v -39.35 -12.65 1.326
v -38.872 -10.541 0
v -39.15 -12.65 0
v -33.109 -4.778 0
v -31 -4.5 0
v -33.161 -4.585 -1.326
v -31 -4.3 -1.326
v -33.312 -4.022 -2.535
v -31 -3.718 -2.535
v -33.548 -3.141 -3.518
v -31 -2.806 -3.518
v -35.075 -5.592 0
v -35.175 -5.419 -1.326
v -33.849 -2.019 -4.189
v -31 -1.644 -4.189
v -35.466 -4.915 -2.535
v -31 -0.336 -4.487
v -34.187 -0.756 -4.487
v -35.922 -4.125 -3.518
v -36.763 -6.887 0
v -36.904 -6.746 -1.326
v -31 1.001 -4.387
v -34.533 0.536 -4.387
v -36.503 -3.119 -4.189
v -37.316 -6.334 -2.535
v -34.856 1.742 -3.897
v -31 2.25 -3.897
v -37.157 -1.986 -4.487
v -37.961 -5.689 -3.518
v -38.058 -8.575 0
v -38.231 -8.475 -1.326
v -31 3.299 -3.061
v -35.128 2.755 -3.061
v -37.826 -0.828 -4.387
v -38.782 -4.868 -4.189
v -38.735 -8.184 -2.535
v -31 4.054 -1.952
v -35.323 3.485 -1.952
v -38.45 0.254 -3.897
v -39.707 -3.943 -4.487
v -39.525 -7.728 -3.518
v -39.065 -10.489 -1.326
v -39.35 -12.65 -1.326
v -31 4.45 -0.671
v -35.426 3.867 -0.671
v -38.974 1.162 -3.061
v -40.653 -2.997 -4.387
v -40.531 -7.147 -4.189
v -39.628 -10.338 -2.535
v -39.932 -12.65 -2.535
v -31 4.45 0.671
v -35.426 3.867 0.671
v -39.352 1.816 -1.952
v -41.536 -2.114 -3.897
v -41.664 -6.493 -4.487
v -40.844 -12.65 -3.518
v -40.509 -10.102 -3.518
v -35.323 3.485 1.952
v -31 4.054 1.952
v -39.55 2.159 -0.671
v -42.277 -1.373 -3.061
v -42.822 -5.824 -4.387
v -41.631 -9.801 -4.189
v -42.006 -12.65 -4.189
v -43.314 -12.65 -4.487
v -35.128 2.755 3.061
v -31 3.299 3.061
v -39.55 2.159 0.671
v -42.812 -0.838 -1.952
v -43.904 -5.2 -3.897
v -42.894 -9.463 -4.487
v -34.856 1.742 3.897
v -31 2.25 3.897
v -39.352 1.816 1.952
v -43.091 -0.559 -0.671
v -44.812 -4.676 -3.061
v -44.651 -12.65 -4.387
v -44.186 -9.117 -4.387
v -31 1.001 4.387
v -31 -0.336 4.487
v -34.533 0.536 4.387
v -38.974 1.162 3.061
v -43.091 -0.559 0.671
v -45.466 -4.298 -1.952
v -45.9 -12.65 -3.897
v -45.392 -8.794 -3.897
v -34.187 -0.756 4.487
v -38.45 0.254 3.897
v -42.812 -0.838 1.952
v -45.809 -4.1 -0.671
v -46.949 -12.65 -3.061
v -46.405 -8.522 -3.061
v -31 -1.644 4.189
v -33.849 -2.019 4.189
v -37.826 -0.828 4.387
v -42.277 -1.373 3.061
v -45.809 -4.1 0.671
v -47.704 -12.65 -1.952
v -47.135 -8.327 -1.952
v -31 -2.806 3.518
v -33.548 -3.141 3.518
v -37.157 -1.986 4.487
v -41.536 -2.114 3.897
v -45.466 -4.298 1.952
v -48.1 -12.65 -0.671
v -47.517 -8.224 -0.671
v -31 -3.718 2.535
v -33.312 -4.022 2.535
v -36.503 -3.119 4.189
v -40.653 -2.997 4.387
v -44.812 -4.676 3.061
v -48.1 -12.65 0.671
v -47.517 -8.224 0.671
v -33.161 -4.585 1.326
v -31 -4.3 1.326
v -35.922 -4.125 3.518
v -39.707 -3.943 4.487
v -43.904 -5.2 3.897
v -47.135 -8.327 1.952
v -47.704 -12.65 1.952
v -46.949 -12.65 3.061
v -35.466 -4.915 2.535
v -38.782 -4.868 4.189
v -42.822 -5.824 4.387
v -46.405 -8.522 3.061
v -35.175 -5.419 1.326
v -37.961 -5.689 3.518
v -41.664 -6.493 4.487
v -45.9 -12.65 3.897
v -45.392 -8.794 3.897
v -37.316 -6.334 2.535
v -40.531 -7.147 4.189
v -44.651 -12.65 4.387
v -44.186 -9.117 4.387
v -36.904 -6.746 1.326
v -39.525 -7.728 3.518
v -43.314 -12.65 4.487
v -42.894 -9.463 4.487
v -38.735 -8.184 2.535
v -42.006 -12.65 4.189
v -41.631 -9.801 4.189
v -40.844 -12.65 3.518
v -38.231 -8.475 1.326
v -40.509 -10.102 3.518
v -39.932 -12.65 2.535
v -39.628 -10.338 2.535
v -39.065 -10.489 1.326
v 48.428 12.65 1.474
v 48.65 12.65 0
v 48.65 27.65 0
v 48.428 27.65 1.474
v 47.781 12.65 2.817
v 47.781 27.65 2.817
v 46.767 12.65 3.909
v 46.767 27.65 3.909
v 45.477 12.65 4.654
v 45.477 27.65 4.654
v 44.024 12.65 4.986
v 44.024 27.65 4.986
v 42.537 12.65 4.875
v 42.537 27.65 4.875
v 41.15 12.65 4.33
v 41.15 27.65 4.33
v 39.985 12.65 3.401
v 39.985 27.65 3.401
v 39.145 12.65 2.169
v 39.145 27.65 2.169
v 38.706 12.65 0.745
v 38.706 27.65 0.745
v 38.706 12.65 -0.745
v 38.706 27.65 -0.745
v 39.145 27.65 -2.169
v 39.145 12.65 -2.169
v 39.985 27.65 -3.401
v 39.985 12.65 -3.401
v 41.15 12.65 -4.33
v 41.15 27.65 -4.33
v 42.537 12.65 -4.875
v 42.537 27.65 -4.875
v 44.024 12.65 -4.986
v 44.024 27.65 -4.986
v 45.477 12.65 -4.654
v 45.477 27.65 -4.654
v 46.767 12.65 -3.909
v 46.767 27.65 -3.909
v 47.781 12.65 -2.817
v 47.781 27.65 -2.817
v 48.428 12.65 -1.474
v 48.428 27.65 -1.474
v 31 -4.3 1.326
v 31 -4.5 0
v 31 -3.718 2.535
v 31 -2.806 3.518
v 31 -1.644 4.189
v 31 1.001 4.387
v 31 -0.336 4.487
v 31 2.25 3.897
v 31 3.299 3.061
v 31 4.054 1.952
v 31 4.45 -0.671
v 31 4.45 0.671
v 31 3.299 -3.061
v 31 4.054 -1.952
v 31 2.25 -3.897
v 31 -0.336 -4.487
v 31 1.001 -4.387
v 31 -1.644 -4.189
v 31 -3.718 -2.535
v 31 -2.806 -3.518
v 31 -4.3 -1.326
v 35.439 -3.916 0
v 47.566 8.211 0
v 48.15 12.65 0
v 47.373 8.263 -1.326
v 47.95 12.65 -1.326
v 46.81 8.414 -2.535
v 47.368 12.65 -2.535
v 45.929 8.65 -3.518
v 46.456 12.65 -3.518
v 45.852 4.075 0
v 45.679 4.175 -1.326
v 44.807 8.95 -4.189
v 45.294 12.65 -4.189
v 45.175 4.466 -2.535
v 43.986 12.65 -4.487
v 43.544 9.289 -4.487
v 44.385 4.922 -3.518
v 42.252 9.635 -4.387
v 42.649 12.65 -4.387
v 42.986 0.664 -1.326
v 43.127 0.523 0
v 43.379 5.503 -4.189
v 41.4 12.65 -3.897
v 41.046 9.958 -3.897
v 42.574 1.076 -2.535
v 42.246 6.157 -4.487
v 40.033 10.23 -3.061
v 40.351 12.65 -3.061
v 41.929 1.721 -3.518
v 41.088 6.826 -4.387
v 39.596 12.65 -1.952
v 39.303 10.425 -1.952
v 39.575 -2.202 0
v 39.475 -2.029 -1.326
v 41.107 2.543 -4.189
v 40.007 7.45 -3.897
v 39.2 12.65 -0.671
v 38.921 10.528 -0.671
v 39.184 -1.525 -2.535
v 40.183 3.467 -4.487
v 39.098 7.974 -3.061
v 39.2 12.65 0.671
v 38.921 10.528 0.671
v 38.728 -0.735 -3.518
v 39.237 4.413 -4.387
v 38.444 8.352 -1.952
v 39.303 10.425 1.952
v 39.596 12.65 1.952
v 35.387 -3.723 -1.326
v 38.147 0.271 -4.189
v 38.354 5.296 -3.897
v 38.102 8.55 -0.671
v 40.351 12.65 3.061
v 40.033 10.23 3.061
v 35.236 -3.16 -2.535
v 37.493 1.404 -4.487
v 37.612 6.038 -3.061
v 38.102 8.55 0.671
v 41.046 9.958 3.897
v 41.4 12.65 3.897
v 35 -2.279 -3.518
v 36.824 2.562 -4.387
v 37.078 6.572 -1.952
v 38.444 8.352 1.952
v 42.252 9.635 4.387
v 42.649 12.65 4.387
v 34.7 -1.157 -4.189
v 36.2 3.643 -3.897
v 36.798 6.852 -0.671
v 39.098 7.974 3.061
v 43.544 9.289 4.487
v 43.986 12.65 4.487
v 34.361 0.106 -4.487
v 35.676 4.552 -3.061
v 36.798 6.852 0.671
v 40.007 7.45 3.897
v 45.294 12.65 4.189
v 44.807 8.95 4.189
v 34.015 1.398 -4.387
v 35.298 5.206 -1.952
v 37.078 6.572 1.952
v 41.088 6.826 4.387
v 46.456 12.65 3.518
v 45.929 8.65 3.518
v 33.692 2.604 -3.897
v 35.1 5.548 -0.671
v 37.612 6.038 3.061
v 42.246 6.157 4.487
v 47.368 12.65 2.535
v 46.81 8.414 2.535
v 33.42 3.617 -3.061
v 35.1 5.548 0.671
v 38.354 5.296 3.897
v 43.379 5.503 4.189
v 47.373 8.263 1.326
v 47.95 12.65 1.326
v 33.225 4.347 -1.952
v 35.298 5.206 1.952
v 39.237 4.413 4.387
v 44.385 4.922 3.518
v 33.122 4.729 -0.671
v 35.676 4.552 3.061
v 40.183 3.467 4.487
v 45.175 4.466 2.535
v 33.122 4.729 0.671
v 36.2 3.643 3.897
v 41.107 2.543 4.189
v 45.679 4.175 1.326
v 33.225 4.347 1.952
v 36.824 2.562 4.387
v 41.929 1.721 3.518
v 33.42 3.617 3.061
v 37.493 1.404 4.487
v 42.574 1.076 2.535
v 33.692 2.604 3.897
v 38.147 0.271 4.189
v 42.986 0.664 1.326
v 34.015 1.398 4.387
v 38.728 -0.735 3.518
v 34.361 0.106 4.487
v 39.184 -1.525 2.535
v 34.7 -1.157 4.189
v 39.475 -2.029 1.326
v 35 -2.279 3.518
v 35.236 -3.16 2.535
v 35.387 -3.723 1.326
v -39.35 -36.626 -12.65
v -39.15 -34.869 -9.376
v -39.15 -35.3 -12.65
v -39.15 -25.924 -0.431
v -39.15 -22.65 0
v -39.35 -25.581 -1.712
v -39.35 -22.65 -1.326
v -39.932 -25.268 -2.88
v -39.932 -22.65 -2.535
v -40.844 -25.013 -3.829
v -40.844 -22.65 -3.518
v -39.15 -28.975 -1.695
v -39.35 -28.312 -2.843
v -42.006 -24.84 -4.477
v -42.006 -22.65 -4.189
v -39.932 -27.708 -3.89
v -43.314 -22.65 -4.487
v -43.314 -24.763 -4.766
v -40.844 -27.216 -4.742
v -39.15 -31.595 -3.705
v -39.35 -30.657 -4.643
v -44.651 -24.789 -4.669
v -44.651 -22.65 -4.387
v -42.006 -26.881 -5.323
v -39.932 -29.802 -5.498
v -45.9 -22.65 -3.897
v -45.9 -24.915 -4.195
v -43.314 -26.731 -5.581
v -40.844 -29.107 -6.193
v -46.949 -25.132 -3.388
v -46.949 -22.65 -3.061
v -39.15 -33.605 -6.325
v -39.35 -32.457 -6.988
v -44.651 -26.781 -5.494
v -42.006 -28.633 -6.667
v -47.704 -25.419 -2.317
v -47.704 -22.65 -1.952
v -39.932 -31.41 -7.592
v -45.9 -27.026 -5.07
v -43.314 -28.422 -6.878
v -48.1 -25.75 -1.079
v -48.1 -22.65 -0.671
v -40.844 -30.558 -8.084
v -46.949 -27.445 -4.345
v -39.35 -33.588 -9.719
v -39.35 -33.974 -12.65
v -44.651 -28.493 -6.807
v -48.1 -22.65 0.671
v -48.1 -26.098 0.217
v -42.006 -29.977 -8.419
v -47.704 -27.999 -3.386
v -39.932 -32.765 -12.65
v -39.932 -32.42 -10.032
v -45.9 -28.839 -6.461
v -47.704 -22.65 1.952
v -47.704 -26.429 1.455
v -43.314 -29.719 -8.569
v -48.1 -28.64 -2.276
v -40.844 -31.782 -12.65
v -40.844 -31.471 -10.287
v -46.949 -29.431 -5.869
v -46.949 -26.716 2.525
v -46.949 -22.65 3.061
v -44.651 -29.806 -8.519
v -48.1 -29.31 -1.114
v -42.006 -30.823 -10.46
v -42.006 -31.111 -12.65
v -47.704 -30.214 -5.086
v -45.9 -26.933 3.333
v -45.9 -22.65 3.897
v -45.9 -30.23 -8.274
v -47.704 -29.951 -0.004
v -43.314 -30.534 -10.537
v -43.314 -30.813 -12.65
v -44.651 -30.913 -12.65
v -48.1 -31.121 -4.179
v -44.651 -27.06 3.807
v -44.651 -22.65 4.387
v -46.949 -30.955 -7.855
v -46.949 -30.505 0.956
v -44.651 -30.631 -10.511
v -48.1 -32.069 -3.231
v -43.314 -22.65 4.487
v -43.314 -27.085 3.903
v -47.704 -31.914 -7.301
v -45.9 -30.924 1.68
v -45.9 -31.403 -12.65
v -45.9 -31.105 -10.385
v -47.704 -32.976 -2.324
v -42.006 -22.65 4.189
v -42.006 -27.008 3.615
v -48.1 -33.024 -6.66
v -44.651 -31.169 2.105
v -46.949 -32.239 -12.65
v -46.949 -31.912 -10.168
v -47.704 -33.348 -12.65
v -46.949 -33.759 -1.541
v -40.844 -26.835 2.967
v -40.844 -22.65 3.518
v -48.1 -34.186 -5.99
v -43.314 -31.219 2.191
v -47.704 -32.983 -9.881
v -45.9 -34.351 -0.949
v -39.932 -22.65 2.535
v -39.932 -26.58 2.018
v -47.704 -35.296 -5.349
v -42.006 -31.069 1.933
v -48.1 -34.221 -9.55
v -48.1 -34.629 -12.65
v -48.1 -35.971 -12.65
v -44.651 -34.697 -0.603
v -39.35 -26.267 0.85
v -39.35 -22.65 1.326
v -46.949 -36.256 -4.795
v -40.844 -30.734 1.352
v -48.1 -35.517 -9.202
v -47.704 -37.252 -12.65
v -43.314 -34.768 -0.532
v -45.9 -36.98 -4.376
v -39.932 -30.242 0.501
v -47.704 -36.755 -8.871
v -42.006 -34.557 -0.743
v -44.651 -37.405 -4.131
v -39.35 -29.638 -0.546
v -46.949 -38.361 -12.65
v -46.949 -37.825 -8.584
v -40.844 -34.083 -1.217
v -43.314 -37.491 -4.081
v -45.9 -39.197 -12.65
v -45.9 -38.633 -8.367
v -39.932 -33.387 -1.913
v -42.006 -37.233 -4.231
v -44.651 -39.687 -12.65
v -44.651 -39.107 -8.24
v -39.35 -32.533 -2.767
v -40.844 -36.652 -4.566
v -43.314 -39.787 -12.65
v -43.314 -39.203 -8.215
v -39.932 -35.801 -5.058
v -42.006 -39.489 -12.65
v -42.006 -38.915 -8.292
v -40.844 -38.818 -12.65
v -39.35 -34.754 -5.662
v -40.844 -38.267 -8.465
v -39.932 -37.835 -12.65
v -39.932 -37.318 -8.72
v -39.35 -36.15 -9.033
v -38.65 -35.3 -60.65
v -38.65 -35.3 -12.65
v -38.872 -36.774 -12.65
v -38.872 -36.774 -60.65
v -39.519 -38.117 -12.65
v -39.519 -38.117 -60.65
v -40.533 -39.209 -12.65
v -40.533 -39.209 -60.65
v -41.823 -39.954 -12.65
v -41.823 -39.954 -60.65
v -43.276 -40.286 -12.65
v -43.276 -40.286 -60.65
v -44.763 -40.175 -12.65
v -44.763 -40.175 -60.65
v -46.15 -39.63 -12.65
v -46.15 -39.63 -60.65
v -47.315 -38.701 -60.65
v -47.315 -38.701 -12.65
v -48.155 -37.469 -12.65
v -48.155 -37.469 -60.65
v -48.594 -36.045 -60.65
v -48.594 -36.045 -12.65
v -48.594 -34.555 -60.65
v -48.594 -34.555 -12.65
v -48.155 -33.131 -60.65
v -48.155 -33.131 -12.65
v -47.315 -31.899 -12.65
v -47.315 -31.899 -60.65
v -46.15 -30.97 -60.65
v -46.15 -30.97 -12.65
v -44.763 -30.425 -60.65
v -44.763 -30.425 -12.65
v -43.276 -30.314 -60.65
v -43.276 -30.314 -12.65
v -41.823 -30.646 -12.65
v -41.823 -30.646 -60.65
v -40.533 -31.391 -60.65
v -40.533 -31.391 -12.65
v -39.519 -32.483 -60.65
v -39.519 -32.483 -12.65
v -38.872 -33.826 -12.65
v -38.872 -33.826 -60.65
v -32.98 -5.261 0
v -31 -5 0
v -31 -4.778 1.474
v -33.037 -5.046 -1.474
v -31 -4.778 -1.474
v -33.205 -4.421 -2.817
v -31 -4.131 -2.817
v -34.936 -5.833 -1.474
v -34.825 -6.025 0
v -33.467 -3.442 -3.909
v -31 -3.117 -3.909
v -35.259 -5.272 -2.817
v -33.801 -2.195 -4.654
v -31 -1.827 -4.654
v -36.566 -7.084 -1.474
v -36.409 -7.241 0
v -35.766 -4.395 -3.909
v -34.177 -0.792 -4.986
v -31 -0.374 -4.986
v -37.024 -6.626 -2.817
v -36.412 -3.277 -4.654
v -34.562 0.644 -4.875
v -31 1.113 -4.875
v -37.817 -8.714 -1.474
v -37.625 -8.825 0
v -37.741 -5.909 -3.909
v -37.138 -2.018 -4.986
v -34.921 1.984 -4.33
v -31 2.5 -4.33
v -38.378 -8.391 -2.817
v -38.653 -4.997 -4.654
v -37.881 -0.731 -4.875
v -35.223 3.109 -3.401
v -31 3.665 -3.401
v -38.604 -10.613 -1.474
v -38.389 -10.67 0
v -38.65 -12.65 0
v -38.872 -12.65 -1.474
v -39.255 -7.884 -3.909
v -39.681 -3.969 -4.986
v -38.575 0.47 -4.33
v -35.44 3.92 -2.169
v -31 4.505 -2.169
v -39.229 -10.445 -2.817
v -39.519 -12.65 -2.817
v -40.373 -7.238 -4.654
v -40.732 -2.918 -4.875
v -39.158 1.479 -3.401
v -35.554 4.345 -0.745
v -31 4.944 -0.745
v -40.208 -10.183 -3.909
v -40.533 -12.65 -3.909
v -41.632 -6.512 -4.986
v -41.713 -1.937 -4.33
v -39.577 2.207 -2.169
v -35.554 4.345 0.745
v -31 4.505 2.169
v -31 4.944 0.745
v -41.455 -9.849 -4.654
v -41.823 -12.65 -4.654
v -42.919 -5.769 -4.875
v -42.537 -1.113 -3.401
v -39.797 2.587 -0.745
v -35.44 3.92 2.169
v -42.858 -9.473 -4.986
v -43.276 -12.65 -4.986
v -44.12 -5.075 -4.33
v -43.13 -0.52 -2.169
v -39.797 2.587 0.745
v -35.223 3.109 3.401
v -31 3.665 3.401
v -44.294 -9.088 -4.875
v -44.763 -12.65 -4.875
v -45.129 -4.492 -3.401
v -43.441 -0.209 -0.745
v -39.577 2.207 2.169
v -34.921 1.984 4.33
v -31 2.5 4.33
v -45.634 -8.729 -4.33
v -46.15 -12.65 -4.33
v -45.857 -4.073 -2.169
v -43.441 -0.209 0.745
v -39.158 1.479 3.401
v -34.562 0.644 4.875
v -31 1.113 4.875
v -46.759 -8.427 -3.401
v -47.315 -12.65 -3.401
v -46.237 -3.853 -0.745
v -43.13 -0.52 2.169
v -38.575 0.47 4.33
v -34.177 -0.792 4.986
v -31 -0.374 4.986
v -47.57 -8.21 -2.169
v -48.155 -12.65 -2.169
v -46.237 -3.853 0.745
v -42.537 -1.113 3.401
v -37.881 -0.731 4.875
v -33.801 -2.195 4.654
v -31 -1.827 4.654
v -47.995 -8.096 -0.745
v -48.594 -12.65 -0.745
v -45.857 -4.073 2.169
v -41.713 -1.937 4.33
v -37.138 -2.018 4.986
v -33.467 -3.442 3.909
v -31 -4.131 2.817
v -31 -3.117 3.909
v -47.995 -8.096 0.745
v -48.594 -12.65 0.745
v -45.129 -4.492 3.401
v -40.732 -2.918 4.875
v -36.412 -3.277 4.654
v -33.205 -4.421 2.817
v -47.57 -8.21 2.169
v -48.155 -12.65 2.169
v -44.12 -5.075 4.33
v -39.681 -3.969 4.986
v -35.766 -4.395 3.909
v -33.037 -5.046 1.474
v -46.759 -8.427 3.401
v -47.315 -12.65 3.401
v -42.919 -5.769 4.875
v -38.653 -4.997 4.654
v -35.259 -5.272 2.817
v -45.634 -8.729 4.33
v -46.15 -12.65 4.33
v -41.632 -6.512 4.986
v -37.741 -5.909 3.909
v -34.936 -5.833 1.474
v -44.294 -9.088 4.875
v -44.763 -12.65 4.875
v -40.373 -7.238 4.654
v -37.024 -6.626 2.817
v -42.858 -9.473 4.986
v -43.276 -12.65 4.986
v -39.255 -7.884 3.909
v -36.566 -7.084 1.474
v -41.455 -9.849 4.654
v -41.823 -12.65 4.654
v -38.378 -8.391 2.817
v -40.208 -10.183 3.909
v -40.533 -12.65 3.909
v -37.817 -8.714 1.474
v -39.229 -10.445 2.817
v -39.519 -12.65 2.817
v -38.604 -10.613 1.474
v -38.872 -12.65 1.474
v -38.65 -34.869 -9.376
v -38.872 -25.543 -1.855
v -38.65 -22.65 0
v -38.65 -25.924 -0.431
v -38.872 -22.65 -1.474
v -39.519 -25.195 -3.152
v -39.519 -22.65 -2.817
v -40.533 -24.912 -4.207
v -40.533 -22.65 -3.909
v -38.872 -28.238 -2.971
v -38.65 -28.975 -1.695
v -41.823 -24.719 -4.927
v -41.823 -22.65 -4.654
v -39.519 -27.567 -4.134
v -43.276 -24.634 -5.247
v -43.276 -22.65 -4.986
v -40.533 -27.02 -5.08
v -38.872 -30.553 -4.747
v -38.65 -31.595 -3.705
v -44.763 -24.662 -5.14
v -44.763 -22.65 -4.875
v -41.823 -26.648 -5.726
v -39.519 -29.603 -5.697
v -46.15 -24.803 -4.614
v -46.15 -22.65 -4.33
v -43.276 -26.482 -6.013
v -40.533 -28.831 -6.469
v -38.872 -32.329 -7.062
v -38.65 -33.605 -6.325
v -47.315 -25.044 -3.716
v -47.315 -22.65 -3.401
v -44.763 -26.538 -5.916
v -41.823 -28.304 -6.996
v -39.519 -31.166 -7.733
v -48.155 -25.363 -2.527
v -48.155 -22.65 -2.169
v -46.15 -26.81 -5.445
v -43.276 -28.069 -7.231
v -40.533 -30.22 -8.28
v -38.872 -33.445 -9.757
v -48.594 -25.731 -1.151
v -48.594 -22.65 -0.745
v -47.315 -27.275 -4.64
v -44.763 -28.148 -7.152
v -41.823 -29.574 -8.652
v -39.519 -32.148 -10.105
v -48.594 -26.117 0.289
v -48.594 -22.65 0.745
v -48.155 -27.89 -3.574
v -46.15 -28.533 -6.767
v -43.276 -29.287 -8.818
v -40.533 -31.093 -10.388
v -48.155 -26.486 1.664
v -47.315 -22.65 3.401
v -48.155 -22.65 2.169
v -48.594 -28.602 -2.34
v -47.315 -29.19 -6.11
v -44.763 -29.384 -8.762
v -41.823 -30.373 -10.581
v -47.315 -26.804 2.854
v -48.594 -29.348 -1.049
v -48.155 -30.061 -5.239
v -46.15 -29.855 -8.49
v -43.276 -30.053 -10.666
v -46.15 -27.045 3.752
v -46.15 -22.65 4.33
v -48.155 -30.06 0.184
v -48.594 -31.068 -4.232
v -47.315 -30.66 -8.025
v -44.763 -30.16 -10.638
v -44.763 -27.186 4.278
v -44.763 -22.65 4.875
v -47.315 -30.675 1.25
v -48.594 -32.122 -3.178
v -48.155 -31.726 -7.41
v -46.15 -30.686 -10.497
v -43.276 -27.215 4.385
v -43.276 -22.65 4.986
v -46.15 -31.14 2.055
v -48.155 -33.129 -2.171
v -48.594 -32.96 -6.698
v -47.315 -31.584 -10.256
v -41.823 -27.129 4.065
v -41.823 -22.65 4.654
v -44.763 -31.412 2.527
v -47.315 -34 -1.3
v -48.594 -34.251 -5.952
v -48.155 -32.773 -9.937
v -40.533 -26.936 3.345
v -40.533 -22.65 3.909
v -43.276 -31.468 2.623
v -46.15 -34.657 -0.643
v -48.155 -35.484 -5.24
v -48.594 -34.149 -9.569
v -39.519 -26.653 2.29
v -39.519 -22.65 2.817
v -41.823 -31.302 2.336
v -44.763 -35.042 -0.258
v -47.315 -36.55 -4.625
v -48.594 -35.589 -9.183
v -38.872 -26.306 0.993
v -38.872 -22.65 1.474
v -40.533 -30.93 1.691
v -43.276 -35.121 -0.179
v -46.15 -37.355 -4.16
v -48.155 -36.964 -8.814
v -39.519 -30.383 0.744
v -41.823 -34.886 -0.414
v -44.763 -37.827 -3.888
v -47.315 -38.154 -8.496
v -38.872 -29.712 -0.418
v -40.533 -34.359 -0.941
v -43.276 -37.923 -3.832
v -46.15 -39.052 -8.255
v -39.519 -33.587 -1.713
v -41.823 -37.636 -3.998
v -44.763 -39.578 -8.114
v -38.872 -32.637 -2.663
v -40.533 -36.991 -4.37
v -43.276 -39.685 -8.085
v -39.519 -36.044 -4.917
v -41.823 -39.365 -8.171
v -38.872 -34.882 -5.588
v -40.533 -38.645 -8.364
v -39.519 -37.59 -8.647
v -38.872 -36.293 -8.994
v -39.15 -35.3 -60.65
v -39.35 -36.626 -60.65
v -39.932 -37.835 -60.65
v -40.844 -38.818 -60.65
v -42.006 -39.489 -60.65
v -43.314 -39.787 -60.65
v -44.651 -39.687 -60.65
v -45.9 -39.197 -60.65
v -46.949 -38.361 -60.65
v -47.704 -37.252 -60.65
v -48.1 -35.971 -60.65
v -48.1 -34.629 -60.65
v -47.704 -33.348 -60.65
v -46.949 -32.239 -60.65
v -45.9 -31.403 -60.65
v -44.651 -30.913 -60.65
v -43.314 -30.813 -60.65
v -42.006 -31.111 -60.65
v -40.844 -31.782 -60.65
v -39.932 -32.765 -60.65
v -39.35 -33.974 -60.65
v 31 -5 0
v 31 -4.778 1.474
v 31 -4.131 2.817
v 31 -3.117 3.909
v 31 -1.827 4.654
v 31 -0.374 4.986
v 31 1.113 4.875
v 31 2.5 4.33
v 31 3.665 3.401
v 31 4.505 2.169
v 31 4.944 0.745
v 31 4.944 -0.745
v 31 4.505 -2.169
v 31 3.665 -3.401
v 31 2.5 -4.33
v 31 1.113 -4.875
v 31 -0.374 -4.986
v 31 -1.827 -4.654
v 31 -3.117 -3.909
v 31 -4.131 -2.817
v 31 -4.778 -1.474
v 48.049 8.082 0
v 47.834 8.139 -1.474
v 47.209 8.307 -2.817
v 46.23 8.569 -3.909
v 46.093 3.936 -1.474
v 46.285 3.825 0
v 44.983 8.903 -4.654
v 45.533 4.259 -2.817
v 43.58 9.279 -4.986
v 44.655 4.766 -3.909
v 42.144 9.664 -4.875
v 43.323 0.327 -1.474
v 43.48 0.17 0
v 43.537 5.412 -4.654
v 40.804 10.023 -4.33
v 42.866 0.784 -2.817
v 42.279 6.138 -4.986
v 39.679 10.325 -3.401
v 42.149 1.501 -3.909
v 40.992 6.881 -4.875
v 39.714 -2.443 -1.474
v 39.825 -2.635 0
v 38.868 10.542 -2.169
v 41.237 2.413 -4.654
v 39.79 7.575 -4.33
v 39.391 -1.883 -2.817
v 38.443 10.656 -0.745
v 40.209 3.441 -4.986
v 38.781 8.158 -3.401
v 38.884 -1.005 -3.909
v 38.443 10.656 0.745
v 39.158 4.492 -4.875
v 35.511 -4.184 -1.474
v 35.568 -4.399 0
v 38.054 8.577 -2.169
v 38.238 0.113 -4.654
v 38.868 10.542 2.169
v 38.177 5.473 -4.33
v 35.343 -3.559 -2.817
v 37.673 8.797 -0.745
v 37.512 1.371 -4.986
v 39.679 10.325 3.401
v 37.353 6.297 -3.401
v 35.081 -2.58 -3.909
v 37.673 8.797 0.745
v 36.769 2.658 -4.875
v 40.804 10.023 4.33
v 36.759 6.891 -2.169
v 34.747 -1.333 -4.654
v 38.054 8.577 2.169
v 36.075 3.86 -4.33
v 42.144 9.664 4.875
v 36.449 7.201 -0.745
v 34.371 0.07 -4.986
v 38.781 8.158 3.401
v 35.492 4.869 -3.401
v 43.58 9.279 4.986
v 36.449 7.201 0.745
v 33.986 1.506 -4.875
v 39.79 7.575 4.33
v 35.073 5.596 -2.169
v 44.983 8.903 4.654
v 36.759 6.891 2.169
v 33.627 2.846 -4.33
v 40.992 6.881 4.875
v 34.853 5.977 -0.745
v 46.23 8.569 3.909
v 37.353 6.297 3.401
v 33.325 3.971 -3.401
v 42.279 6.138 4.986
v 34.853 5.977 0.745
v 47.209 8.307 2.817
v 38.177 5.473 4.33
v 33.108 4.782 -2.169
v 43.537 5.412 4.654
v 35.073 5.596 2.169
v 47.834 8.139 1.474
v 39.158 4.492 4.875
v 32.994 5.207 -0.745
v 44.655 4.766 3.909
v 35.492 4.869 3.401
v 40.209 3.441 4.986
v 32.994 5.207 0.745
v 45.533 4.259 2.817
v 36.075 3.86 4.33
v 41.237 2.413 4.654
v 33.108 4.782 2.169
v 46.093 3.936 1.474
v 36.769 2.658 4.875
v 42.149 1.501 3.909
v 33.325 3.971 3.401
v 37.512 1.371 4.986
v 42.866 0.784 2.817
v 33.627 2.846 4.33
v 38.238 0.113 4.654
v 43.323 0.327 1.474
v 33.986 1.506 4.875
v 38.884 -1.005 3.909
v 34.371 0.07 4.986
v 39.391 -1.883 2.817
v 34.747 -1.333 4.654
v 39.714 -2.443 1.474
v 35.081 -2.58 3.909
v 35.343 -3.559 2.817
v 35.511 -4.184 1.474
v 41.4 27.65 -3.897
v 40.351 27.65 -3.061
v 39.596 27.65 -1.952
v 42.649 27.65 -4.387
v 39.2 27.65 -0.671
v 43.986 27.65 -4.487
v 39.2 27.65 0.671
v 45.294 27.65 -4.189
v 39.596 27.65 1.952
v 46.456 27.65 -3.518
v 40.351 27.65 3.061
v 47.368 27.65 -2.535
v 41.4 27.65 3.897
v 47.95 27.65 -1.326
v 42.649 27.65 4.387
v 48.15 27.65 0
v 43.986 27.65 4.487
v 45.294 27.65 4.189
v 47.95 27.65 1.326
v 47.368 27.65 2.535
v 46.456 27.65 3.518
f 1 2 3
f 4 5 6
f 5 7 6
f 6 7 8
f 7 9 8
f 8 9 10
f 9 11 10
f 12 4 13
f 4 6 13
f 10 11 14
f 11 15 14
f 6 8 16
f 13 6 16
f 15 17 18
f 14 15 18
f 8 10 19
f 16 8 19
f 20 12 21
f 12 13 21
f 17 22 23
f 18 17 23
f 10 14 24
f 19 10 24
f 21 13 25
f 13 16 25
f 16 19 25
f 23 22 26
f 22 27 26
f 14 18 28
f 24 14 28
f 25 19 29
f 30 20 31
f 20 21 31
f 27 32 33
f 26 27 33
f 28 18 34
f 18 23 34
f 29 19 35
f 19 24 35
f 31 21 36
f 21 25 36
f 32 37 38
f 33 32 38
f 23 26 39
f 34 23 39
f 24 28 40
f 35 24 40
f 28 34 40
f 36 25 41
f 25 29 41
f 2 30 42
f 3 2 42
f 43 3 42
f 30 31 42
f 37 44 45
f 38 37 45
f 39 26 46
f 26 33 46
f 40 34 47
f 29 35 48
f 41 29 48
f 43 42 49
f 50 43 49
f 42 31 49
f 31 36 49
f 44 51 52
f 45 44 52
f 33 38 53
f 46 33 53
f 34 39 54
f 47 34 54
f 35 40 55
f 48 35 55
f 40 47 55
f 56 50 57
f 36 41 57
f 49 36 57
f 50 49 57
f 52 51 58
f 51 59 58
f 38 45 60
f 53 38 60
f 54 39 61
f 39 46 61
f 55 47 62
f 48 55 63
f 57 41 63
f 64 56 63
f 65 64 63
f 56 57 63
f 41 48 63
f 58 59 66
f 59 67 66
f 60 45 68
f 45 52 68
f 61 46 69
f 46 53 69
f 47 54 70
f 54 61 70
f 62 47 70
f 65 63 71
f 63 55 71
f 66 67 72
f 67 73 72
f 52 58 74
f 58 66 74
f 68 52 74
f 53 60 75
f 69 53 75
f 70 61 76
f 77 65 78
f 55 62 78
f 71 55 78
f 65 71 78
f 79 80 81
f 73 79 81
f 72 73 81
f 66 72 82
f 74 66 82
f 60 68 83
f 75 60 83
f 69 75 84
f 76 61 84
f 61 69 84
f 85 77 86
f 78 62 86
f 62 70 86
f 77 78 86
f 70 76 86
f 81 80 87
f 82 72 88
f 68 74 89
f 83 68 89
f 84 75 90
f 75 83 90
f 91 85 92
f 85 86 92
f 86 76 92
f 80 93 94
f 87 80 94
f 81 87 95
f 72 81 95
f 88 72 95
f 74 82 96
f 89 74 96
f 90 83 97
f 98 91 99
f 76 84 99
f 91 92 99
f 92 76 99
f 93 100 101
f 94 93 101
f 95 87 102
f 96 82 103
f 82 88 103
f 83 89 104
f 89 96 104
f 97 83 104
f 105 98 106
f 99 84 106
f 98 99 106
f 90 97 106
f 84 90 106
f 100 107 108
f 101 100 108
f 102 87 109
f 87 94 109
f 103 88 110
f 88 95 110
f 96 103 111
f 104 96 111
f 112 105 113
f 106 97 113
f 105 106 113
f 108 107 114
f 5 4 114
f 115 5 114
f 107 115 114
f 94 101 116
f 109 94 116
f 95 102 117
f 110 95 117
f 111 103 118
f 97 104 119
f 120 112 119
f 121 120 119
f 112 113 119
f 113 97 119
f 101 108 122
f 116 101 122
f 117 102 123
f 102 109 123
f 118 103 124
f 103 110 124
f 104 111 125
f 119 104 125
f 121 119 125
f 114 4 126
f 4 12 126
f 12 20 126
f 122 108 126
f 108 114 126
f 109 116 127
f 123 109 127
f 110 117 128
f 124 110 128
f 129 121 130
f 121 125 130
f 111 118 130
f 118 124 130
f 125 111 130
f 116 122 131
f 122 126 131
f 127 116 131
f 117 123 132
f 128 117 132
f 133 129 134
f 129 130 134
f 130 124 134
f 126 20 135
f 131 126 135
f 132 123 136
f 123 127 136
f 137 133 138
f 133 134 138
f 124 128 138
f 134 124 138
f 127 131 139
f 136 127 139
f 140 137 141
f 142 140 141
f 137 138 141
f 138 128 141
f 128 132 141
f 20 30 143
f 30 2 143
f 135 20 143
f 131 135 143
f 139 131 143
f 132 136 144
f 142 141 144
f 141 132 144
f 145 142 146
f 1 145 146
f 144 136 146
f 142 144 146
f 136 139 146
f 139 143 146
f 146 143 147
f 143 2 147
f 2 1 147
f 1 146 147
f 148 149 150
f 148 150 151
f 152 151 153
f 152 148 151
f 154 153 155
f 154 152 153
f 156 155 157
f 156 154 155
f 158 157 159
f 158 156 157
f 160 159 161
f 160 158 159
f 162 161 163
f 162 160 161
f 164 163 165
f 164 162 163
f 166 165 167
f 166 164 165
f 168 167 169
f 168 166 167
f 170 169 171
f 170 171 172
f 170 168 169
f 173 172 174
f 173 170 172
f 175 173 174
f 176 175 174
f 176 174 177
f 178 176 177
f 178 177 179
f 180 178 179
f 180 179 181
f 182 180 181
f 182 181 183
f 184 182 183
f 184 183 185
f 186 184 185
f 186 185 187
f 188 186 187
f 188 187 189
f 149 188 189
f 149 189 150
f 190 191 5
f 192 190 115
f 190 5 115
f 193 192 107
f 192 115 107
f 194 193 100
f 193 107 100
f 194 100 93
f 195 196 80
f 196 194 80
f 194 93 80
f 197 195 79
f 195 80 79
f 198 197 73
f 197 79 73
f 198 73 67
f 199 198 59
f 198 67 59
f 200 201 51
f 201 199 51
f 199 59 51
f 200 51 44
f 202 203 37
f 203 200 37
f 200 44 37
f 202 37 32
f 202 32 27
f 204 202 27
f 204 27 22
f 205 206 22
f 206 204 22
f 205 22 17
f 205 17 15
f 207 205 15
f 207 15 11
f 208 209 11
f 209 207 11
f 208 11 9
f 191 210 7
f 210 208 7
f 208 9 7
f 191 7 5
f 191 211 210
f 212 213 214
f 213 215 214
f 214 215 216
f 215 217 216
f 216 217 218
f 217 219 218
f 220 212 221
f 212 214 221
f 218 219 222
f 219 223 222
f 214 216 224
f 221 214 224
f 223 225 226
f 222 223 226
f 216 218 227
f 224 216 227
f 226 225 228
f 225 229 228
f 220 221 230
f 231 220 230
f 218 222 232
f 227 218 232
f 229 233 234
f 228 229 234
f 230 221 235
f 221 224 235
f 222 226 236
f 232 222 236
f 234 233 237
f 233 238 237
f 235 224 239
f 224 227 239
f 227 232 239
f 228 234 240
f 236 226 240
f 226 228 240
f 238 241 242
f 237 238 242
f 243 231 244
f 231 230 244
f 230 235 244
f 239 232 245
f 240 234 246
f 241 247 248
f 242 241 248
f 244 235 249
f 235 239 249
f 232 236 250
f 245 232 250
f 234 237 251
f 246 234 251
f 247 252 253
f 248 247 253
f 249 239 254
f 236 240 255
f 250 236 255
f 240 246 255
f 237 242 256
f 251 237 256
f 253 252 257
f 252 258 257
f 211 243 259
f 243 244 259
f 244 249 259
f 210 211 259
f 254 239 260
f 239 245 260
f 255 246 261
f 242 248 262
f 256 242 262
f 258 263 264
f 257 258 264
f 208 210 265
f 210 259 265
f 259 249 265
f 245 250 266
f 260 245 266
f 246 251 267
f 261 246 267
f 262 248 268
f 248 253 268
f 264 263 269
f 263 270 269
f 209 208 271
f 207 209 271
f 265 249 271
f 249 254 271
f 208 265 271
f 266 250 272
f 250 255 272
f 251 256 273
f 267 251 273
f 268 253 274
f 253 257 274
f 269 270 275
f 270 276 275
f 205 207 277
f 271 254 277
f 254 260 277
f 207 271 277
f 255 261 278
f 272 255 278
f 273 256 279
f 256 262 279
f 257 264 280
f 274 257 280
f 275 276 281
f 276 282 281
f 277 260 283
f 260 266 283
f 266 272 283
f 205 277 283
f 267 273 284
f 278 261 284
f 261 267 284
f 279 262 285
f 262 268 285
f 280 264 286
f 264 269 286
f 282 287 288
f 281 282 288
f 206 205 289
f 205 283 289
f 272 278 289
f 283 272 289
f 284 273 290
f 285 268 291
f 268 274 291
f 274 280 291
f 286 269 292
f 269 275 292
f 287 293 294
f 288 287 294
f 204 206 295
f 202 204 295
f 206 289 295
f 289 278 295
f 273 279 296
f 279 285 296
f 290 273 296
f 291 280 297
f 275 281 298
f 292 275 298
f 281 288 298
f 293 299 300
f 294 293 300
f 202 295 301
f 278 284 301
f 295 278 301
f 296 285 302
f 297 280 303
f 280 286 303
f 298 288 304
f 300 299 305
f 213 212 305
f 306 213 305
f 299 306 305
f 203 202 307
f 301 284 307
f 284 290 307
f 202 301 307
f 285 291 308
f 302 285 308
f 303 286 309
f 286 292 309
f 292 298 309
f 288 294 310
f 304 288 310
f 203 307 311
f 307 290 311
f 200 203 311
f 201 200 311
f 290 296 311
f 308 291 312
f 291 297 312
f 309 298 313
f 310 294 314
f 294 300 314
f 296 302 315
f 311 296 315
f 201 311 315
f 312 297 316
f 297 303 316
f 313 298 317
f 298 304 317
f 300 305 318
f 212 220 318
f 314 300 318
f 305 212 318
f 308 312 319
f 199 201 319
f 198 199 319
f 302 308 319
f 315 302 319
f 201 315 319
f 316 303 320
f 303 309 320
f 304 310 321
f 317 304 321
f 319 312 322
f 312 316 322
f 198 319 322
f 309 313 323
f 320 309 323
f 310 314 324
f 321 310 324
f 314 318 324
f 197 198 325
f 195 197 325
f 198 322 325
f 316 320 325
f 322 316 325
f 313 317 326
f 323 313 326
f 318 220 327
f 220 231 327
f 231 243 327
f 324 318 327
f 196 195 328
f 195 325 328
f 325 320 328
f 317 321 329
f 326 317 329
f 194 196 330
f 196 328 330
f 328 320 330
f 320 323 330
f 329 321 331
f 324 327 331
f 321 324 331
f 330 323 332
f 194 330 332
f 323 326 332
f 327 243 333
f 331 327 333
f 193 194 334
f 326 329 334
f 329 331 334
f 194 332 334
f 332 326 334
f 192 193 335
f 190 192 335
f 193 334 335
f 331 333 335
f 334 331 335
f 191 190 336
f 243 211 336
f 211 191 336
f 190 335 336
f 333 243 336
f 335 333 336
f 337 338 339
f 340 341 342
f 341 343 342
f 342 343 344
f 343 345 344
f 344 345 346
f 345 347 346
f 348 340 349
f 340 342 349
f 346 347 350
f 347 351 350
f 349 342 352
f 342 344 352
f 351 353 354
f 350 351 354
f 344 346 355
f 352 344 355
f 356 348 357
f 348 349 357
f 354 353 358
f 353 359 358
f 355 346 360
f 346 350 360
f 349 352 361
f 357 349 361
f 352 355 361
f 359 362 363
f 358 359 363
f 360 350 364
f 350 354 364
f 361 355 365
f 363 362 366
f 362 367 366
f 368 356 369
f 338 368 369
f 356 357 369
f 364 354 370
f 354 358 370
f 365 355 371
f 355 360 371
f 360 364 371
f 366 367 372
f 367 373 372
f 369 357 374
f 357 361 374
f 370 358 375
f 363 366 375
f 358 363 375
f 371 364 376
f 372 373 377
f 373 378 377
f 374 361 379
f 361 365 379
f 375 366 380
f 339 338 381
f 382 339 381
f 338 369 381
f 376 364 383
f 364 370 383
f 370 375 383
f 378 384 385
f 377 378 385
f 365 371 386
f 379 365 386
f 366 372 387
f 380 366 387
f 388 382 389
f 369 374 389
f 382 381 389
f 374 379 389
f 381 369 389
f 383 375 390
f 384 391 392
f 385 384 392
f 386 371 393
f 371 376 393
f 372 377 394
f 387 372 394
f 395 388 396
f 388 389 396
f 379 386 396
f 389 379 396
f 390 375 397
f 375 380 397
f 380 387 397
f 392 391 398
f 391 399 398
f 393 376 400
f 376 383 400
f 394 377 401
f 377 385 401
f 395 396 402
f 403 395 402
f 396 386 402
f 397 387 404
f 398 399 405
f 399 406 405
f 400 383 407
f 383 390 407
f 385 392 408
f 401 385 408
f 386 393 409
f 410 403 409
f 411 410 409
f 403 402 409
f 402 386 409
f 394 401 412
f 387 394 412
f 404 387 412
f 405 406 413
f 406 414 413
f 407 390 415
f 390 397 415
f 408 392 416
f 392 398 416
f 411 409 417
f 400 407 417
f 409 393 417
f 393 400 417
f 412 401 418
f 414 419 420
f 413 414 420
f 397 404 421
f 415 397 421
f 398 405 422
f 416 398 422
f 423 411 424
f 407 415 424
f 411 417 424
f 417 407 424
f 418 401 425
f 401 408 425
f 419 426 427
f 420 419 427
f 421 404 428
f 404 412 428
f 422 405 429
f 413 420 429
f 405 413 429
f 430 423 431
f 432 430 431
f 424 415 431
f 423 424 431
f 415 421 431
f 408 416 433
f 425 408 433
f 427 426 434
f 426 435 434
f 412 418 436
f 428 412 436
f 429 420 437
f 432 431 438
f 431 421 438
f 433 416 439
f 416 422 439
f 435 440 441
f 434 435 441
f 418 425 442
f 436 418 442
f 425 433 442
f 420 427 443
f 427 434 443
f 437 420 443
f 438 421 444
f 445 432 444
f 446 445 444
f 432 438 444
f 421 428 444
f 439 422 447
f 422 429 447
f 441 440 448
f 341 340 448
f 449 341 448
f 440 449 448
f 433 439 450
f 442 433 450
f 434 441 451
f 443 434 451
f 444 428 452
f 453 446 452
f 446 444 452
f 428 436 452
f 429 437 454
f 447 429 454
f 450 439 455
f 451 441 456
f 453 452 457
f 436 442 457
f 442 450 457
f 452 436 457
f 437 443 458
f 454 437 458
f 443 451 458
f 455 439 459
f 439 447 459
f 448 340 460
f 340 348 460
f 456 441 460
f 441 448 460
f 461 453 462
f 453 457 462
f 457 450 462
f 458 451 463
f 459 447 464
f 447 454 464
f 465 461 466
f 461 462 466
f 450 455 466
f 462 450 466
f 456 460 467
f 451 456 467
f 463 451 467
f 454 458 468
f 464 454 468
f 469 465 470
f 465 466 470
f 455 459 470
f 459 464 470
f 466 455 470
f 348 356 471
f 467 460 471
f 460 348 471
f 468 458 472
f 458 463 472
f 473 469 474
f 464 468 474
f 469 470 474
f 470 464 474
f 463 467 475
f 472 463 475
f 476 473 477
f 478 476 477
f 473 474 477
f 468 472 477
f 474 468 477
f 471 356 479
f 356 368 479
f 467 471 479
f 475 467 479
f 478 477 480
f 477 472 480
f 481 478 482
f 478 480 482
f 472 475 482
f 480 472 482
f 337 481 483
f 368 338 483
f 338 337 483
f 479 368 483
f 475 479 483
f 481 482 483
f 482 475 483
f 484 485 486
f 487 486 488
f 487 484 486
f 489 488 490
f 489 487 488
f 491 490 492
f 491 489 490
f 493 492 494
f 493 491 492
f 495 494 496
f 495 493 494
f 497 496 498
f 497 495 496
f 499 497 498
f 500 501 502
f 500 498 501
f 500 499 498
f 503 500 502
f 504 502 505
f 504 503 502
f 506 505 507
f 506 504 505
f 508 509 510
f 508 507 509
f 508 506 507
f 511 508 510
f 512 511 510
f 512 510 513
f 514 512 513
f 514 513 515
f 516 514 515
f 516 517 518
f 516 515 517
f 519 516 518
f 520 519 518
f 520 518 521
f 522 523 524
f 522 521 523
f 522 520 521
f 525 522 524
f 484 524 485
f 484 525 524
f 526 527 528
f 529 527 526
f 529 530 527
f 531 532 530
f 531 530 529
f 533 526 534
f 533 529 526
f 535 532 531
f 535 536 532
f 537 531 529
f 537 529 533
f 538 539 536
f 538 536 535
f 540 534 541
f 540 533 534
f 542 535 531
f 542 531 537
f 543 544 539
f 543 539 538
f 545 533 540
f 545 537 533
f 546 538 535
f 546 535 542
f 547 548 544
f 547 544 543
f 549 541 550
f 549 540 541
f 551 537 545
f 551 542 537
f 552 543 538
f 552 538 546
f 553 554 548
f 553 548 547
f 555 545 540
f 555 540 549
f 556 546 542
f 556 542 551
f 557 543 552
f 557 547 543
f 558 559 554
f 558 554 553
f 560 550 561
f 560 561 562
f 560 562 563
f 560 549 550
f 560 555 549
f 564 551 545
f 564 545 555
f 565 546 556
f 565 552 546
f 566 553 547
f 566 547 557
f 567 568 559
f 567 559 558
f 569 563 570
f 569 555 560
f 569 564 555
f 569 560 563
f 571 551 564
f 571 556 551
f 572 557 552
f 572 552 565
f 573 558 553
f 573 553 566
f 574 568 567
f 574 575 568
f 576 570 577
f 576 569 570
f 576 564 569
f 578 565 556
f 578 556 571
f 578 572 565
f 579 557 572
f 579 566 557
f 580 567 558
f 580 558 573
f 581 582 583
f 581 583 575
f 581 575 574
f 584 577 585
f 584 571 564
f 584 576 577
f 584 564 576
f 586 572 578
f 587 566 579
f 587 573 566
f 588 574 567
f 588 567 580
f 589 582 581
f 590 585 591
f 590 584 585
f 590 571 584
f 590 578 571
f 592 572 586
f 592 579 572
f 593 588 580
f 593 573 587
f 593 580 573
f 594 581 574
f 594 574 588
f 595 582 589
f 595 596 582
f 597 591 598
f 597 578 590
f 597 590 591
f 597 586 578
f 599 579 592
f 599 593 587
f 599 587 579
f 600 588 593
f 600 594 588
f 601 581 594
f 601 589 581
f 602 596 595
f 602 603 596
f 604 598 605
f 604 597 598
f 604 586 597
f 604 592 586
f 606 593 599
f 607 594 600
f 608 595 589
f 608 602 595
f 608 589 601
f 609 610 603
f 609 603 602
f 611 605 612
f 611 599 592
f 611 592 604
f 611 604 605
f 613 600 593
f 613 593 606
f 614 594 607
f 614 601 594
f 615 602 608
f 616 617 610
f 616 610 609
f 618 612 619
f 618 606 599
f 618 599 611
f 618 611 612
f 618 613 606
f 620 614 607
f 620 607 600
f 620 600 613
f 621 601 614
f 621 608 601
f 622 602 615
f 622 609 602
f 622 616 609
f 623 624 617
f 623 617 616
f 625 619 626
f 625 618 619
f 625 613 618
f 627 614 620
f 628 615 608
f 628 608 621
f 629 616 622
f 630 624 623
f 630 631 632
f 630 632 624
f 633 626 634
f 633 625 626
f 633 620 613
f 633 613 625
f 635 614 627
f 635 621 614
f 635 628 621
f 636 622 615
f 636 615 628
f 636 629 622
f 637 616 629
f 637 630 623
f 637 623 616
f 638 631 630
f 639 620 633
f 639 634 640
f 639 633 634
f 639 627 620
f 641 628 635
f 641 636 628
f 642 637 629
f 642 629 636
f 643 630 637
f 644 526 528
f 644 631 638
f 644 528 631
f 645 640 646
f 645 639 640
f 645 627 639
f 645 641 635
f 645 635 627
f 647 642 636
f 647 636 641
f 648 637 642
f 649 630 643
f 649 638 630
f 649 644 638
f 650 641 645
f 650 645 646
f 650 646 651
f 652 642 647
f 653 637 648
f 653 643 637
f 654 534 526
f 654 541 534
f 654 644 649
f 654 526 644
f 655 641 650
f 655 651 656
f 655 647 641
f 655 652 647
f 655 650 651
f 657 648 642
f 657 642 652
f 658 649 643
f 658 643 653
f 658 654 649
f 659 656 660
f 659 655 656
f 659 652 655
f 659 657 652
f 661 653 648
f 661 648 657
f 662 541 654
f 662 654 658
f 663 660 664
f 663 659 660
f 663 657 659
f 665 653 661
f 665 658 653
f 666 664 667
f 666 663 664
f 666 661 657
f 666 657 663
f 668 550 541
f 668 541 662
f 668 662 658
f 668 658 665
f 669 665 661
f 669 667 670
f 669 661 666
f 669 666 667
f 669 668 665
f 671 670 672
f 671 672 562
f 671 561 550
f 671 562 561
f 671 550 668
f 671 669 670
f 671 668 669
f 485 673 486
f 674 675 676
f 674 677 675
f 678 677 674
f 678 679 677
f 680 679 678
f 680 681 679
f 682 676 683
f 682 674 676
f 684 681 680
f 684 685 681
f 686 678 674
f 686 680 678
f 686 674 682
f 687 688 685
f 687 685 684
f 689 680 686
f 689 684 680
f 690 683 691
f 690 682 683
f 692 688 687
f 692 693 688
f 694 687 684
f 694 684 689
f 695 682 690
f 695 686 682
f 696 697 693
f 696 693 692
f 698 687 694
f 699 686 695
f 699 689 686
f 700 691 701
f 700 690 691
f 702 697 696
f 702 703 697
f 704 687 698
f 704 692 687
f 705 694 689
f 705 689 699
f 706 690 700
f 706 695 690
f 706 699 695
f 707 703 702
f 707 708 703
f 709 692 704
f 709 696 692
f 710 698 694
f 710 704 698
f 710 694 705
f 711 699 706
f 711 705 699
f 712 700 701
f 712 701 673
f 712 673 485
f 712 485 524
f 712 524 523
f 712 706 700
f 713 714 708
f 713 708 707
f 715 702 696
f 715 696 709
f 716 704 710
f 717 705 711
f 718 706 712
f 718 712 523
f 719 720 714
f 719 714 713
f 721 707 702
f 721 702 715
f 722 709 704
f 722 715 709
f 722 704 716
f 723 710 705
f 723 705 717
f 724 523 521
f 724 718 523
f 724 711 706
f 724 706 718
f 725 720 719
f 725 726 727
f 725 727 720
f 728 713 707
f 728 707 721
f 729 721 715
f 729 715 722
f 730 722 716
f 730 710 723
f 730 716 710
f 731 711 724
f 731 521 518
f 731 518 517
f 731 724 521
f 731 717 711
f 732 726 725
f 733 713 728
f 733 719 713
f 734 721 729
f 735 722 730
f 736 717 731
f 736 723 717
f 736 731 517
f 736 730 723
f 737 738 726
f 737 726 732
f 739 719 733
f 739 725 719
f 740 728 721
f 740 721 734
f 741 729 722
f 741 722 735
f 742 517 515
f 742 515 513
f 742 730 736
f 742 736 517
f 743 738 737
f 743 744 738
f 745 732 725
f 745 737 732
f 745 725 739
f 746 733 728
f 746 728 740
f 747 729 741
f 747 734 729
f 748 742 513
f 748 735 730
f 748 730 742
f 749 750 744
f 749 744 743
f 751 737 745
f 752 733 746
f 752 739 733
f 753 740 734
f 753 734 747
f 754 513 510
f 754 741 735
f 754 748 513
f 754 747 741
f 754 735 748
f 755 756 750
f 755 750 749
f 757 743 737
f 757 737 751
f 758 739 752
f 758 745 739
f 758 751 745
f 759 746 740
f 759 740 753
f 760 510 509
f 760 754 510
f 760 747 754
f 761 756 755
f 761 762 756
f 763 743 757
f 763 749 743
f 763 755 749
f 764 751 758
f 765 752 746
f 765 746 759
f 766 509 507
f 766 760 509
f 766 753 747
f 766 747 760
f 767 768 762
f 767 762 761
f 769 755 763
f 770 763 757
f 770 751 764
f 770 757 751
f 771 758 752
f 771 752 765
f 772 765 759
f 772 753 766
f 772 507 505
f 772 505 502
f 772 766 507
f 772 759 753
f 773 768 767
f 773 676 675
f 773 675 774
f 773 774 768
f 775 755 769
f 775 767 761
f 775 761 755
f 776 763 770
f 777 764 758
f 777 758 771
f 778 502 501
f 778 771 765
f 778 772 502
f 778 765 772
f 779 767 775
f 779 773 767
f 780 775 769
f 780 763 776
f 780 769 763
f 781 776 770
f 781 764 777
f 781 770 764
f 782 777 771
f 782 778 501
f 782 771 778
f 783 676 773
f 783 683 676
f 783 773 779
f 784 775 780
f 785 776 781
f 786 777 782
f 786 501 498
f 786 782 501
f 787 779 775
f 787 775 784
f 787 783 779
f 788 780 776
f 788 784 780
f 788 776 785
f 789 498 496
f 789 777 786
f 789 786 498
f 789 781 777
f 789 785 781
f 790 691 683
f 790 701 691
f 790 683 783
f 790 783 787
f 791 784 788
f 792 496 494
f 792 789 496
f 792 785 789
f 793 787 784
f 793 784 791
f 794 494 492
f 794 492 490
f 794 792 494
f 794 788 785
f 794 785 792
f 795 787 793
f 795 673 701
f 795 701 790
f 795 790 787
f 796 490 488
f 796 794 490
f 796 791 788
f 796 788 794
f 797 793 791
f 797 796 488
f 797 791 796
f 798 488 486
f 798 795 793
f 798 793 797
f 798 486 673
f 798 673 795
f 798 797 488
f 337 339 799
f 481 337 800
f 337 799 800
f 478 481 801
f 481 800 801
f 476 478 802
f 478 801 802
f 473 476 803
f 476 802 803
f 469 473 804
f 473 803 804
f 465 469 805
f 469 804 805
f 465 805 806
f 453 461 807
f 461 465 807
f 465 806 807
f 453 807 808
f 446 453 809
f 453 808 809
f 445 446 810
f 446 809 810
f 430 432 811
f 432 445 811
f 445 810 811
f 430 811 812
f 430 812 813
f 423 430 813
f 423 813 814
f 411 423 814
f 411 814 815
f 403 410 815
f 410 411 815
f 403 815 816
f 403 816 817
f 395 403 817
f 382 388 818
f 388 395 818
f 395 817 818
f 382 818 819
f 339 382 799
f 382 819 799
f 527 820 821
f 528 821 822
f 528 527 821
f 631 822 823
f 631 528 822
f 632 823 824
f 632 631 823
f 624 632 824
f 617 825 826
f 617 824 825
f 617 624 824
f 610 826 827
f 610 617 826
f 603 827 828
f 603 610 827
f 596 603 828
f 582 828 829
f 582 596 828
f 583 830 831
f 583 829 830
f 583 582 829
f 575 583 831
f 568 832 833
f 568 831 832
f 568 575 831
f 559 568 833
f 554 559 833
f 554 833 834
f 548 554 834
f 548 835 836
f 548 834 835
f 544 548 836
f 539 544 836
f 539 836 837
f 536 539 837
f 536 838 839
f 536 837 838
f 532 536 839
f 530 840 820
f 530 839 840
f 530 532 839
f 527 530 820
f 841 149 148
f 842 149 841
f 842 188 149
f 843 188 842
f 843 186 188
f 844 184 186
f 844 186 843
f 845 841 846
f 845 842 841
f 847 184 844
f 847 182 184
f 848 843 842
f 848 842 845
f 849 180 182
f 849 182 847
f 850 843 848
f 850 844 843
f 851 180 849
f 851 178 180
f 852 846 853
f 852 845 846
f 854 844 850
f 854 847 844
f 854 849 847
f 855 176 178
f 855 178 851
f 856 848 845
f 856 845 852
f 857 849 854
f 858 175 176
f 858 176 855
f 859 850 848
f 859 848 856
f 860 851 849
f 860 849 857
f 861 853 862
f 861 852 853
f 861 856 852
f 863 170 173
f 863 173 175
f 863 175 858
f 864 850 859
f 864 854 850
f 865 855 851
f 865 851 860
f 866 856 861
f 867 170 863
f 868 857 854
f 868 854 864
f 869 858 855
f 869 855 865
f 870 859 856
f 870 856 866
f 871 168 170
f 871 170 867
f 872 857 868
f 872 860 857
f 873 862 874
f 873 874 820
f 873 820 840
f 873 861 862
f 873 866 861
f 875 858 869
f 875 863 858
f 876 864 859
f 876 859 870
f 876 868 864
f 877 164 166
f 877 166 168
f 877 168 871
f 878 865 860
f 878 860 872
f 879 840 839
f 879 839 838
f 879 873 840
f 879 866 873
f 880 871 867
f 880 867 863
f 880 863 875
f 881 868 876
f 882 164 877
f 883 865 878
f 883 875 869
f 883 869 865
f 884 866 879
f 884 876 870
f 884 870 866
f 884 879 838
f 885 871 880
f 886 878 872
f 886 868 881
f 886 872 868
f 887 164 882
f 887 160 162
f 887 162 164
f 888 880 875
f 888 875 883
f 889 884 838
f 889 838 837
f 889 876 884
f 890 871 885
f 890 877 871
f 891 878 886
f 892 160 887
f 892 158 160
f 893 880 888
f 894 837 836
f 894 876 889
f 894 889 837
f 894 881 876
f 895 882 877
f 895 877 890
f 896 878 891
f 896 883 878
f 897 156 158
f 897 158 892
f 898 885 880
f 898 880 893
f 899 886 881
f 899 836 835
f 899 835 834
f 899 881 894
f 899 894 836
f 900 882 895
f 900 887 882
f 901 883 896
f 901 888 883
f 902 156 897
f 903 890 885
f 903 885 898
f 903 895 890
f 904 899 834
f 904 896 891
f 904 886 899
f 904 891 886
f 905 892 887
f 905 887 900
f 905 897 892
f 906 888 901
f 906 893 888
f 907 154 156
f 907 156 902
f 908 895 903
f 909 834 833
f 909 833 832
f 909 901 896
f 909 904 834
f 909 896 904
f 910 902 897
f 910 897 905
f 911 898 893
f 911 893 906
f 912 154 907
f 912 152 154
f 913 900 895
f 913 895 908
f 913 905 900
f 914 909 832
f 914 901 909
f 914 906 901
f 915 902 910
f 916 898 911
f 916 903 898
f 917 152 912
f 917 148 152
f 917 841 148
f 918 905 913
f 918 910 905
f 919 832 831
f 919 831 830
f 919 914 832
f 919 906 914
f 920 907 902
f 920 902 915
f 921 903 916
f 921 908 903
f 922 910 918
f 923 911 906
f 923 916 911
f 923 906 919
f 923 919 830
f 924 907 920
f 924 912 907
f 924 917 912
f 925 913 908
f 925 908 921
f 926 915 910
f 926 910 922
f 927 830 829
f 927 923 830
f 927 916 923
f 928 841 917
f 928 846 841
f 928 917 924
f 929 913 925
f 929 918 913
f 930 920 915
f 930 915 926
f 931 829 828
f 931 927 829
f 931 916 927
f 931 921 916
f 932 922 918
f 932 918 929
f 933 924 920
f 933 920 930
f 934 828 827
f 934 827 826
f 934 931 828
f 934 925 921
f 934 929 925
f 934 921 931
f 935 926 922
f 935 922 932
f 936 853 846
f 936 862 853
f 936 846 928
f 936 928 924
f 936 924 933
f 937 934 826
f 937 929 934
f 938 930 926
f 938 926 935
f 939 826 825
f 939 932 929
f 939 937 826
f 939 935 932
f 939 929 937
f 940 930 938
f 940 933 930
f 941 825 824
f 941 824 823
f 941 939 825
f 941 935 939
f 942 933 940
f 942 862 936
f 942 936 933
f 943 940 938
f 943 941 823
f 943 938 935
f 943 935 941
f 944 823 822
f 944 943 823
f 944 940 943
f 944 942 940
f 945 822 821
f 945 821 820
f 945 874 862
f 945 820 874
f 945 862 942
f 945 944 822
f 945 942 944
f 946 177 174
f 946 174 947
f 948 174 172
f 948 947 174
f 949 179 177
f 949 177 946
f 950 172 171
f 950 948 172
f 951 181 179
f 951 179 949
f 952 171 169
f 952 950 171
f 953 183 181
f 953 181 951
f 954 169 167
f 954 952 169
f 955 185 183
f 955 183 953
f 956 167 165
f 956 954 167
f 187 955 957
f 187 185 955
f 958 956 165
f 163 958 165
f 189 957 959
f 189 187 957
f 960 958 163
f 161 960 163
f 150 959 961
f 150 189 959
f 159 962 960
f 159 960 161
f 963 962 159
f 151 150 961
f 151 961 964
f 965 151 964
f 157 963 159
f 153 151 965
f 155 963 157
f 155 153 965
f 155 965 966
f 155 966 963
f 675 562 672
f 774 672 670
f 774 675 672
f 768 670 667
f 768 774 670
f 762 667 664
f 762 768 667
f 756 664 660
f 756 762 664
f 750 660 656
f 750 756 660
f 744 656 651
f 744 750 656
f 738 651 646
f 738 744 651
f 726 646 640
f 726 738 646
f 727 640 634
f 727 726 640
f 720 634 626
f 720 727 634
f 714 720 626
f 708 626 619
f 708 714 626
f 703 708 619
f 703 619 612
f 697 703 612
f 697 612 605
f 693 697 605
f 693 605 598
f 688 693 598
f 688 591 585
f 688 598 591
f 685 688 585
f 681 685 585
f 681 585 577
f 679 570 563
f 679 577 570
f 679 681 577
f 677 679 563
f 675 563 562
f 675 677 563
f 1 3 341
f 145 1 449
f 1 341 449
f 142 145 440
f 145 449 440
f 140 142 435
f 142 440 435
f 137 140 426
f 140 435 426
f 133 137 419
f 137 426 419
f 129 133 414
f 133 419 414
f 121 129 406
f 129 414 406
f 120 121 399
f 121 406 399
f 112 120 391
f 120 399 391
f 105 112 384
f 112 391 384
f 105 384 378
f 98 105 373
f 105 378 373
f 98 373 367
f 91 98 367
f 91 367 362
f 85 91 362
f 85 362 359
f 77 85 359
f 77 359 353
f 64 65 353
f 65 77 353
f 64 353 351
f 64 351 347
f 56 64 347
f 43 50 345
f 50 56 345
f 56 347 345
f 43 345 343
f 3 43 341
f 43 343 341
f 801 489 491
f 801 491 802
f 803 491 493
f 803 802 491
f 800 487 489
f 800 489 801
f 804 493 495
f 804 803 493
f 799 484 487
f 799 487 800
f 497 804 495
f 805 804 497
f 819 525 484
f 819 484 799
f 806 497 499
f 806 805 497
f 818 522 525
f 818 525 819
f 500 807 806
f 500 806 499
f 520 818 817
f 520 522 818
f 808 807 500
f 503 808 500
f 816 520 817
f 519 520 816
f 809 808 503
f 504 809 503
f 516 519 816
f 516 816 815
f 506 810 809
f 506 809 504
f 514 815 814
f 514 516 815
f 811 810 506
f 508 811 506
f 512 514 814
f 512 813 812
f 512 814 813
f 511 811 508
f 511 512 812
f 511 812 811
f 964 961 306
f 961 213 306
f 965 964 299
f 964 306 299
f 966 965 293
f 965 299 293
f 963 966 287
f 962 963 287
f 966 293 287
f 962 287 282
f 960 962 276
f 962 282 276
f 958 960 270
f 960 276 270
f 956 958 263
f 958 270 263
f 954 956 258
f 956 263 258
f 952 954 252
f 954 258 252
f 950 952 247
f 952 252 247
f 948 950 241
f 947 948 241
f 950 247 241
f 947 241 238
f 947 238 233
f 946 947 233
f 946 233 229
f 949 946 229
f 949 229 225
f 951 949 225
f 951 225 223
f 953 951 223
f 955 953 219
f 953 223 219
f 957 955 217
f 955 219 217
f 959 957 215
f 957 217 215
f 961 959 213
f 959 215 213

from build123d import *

# Parameters (mm, degrees)
SKETCH2_R = 5
SKETCH6_R = 5
SHELL1_T  = -0.5


with BuildPart() as part:
    # Sweep2: sweep along a path in Sketch1
    with BuildLine(Plane.XY) as sweep2_path:
        Line((43.65, 27.65), (43.65, 12.65))
        ThreePointArc((43.65, 12.65), (39.944900782, 3.705099218), (31, 0))
        Line((31, 0), (-31, 0))
        ThreePointArc((-31, 0), (-39.944900782, -3.705099218), (-43.65, -12.65))
        Line((-43.65, -12.65), (-43.65, -22.65))
    # Sketch2 → Sweep2 (sweep)
    with BuildSketch(Plane(origin=(0, 27.65, 0), x_dir=(1, 0, 0), z_dir=(0, 1, 0))):
        with Locations((43.65, 0)):
            Circle(SKETCH2_R)
    sweep(path=sweep2_path.line)

    # Sweep3: sweep along a path in Sketch5
    with BuildLine(Plane(origin=(-43.65, 0, 0), x_dir=(0, 0, -1), z_dir=(1, 0, 0))) as sweep3_path:
        ThreePointArc((0, -22.65), (3.705099218, -31.594900782), (12.65, -35.3))
        Line((12.65, -35.3), (60.65, -35.3))
    # Sketch6 → Sweep3 (sweep)
    with BuildSketch(Plane.XZ.offset(22.65)):
        with Locations((-43.65, 0)):
            Circle(SKETCH6_R)
    sweep(path=sweep3_path.line)

    # Shell1
    shell1_openings = [part.faces().sort_by_distance(p)[0] for p in [
        (-43.65, -35.3, -60.65),
        (43.65, 27.65, 0),
    ]]
    offset(amount=SHELL1_T, openings=shell1_openings, kind=Kind.INTERSECTION)


solid = part.part
